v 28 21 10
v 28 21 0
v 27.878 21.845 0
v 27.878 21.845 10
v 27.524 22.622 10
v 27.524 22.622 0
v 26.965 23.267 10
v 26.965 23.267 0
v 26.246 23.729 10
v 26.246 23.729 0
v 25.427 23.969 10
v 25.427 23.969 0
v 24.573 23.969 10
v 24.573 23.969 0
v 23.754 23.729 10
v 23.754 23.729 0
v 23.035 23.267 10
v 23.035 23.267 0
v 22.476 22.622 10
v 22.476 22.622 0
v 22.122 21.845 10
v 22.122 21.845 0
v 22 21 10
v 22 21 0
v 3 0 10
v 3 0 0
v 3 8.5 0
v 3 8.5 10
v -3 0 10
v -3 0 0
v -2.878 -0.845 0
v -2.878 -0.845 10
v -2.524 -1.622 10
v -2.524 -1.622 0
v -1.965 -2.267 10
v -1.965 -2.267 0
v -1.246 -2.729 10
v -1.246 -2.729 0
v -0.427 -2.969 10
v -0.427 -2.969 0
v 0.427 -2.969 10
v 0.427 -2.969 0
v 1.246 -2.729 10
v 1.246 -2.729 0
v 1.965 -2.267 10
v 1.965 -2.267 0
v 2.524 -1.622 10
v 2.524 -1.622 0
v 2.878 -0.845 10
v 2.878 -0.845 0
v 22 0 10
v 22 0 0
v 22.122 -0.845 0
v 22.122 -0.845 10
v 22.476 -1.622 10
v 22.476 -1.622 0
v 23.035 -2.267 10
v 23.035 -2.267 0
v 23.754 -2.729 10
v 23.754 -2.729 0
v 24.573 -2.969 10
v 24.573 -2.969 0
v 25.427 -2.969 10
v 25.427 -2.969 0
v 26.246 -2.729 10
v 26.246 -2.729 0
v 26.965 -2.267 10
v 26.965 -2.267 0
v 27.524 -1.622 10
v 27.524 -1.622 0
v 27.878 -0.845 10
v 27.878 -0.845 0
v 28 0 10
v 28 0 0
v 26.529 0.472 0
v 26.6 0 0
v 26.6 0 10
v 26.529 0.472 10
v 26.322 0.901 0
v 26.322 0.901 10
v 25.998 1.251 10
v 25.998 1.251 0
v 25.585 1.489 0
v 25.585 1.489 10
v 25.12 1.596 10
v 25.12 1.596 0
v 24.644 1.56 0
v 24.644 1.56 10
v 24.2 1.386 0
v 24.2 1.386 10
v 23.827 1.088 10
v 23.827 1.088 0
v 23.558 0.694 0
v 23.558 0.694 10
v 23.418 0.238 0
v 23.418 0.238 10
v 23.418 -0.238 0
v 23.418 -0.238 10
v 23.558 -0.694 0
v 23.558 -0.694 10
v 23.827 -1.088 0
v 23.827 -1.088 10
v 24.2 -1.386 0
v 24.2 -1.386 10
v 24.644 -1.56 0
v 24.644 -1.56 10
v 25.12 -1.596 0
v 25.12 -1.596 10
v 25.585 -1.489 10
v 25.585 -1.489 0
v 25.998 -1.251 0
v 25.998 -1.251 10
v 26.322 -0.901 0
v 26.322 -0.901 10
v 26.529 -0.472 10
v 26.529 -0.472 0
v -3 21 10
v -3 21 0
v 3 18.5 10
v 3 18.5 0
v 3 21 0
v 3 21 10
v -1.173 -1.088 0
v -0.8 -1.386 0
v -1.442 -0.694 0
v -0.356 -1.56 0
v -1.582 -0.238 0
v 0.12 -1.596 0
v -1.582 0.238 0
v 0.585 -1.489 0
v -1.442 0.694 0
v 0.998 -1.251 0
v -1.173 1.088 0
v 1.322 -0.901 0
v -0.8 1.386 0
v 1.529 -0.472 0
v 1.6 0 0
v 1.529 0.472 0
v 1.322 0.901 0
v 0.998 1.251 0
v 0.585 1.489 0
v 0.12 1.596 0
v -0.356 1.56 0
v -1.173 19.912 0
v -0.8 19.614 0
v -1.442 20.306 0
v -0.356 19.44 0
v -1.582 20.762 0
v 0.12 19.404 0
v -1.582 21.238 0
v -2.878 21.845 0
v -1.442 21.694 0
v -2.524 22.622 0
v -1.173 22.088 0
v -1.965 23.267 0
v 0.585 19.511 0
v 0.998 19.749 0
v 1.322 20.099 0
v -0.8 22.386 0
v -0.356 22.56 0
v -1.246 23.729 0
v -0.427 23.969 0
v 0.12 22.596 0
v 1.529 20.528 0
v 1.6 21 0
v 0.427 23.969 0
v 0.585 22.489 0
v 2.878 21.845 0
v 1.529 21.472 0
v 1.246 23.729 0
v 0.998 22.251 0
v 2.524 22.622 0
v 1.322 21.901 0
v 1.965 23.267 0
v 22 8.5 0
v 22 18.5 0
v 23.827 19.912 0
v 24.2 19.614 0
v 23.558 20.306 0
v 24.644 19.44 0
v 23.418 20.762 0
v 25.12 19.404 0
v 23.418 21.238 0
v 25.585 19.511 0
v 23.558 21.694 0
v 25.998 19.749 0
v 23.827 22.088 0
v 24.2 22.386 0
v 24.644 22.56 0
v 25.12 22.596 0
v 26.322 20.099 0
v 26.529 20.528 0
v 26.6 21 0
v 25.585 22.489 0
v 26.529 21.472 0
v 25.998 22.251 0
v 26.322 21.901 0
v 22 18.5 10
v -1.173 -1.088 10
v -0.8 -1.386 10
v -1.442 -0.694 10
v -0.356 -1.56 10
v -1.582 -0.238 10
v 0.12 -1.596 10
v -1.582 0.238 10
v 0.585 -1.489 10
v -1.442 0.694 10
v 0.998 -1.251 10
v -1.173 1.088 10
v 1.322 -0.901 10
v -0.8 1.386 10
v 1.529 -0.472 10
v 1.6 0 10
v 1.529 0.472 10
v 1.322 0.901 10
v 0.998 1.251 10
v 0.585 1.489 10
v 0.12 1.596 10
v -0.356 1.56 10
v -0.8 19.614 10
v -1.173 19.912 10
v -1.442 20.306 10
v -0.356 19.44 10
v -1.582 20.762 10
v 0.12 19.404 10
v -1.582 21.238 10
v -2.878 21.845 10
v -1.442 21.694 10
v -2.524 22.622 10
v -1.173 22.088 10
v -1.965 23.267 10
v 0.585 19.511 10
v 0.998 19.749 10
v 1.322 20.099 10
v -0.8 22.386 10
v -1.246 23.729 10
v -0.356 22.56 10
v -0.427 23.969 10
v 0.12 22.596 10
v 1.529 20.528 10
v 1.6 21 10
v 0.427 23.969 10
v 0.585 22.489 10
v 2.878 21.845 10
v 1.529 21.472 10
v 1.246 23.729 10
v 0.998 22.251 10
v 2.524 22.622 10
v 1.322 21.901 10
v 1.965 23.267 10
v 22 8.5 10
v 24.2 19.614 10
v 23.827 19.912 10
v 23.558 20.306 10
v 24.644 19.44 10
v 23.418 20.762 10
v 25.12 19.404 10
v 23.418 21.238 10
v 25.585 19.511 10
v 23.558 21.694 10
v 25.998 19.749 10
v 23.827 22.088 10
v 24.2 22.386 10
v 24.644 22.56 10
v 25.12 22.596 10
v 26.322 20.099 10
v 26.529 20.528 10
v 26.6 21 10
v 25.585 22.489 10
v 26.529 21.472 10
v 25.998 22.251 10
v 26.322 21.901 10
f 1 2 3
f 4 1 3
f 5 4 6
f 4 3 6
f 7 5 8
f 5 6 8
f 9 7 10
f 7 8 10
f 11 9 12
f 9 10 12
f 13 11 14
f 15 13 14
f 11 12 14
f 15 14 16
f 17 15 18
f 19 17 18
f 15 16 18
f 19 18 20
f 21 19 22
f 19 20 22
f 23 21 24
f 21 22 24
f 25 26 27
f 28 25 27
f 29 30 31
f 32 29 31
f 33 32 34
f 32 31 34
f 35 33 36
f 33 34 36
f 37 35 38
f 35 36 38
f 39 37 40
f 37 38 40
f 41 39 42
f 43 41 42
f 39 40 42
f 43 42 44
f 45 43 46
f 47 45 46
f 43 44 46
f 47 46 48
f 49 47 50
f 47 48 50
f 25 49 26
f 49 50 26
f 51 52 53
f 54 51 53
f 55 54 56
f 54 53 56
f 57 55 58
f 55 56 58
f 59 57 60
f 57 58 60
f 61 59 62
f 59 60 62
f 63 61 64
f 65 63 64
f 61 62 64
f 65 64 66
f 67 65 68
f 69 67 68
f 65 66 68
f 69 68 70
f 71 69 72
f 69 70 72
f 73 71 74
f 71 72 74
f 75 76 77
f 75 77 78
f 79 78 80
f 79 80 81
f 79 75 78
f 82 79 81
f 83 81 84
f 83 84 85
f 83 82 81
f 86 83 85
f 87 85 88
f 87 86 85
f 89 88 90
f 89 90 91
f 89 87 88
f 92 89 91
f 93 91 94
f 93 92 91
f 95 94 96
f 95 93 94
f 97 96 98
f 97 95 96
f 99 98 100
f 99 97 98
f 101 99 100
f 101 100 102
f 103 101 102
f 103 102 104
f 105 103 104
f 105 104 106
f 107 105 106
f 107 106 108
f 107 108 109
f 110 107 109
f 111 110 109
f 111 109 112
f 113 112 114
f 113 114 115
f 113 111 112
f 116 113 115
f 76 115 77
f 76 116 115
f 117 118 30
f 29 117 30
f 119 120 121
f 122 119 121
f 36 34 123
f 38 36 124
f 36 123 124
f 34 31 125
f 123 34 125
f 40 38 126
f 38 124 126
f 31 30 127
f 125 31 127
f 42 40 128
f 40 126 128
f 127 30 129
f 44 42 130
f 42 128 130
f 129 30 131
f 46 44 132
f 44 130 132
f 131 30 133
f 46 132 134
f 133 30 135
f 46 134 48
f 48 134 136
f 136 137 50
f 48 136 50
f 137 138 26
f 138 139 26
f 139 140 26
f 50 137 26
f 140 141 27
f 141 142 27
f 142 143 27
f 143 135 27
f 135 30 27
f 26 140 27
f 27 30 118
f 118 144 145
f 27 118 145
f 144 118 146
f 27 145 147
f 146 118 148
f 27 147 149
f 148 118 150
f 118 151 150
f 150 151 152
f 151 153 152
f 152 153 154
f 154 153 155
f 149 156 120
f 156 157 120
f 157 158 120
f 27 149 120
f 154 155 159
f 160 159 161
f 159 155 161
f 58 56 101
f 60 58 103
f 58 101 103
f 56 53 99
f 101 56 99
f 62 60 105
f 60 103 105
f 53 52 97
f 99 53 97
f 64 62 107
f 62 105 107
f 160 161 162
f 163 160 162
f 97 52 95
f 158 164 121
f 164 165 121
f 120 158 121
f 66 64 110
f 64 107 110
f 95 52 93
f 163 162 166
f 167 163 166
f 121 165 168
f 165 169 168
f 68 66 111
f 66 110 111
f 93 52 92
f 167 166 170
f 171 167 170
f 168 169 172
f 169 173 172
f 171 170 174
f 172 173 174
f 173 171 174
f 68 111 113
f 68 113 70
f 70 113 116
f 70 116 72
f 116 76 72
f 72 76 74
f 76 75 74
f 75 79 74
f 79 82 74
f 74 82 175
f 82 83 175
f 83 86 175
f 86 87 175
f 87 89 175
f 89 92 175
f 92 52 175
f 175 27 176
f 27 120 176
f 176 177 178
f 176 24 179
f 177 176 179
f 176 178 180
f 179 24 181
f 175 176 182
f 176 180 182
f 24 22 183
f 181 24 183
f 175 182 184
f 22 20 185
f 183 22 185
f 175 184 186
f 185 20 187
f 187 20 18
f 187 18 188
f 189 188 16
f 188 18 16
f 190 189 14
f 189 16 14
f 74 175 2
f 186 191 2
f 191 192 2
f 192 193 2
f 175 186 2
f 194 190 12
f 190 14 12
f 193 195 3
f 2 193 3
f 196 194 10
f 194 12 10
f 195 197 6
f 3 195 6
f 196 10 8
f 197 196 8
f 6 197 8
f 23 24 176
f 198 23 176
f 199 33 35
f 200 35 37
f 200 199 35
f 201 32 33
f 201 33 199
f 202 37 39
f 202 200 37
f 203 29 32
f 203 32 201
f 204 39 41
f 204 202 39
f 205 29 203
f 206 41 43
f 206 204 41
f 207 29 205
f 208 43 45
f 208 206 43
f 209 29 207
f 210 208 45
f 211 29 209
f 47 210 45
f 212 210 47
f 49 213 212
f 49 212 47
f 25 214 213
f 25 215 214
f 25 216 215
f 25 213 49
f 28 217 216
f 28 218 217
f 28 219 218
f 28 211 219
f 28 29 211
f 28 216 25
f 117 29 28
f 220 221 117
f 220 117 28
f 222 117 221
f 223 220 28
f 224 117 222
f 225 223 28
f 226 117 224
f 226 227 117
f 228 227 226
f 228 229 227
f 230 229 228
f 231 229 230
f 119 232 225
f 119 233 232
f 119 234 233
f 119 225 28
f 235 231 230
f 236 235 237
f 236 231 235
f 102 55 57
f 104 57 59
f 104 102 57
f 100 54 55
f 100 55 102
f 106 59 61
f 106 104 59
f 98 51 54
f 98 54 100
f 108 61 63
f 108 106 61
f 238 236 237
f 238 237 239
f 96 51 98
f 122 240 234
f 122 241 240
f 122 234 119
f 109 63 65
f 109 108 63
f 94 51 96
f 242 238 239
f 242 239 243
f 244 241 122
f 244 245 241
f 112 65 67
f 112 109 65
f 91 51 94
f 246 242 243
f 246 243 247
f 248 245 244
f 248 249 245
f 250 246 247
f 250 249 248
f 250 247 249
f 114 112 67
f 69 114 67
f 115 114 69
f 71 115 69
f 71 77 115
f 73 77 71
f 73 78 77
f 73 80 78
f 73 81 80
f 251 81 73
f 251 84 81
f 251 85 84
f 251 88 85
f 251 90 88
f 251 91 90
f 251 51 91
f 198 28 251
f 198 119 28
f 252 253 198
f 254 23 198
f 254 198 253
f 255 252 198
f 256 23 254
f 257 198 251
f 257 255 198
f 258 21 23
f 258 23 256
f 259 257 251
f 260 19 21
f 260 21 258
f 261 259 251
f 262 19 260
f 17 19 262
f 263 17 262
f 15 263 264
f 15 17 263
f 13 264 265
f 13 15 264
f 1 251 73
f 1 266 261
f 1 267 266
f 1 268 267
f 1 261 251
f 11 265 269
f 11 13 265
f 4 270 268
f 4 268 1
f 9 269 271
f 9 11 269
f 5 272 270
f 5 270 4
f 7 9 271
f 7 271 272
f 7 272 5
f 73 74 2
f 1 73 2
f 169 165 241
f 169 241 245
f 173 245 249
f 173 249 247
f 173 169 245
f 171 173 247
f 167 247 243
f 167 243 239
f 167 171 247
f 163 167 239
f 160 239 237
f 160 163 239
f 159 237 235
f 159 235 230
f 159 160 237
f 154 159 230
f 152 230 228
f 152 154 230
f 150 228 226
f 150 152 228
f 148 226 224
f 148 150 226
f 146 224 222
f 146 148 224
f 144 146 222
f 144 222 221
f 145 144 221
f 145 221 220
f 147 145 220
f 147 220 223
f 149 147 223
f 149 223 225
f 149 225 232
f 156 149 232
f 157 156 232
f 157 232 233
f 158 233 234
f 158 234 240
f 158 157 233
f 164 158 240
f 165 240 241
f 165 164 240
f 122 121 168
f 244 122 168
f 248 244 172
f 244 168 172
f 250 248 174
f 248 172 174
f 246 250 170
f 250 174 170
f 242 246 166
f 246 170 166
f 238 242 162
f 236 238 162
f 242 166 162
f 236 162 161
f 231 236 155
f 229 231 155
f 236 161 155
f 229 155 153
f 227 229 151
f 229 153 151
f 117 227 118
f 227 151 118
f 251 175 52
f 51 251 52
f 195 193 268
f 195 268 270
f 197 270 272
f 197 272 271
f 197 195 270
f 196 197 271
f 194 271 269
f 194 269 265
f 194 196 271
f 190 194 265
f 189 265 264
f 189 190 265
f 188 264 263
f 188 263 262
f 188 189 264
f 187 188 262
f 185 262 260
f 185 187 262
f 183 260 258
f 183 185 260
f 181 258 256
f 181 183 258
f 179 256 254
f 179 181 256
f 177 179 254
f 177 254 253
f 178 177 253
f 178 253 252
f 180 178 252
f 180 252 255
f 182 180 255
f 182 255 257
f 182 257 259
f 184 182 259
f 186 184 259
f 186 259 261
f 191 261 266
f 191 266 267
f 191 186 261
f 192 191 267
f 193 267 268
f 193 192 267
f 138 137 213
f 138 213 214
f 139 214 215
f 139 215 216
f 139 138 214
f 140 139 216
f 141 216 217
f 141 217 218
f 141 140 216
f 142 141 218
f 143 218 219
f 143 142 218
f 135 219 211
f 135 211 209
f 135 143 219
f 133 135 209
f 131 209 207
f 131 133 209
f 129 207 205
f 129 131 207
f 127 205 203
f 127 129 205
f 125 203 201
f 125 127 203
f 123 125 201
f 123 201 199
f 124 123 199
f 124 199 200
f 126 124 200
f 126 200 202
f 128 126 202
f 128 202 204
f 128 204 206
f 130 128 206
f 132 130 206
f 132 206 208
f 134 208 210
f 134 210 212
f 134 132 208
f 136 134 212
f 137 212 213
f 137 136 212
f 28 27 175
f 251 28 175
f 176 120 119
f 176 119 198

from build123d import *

# Parameters (mm, degrees)
SKETCH1_R           = 1.6
SKETCH1_W           = 19
SKETCH1_H           = 10
BOSS_EXTRUDE1_DEPTH = 10


with BuildPart() as part:
    # Sketch1 → Boss-Extrude1 (new body)
    with BuildSketch(Plane.XY):
        with BuildLine():
            Line((3, 0), (3, 21))
            ThreePointArc((3, 21), (0, 24), (-3, 21))
            Line((-3, 21), (-3, 0))
            ThreePointArc((-3, 0), (0, -3), (3, 0))
        make_face()
        Circle(SKETCH1_R, mode=Mode.SUBTRACT)
        with Locations((0, 21)):
            Circle(SKETCH1_R, mode=Mode.SUBTRACT)
        with Locations((12.5, 13.5)):
            Rectangle(SKETCH1_W, SKETCH1_H)
        with BuildLine():
            Line((22, 18.5), (22, 8.5))
            Line((22, 8.5), (22, 0))
            ThreePointArc((22, 0), (25, -3), (28, 0))
            Line((28, 0), (28, 21))
            ThreePointArc((28, 21), (25, 24), (22, 21))
            Line((22, 21), (22, 18.5))
        make_face()
        with Locations((25, 0)):
            Circle(SKETCH1_R, mode=Mode.SUBTRACT)
        with Locations((25, 21)):
            Circle(SKETCH1_R, mode=Mode.SUBTRACT)
    extrude(amount=BOSS_EXTRUDE1_DEPTH)


solid = part.part
